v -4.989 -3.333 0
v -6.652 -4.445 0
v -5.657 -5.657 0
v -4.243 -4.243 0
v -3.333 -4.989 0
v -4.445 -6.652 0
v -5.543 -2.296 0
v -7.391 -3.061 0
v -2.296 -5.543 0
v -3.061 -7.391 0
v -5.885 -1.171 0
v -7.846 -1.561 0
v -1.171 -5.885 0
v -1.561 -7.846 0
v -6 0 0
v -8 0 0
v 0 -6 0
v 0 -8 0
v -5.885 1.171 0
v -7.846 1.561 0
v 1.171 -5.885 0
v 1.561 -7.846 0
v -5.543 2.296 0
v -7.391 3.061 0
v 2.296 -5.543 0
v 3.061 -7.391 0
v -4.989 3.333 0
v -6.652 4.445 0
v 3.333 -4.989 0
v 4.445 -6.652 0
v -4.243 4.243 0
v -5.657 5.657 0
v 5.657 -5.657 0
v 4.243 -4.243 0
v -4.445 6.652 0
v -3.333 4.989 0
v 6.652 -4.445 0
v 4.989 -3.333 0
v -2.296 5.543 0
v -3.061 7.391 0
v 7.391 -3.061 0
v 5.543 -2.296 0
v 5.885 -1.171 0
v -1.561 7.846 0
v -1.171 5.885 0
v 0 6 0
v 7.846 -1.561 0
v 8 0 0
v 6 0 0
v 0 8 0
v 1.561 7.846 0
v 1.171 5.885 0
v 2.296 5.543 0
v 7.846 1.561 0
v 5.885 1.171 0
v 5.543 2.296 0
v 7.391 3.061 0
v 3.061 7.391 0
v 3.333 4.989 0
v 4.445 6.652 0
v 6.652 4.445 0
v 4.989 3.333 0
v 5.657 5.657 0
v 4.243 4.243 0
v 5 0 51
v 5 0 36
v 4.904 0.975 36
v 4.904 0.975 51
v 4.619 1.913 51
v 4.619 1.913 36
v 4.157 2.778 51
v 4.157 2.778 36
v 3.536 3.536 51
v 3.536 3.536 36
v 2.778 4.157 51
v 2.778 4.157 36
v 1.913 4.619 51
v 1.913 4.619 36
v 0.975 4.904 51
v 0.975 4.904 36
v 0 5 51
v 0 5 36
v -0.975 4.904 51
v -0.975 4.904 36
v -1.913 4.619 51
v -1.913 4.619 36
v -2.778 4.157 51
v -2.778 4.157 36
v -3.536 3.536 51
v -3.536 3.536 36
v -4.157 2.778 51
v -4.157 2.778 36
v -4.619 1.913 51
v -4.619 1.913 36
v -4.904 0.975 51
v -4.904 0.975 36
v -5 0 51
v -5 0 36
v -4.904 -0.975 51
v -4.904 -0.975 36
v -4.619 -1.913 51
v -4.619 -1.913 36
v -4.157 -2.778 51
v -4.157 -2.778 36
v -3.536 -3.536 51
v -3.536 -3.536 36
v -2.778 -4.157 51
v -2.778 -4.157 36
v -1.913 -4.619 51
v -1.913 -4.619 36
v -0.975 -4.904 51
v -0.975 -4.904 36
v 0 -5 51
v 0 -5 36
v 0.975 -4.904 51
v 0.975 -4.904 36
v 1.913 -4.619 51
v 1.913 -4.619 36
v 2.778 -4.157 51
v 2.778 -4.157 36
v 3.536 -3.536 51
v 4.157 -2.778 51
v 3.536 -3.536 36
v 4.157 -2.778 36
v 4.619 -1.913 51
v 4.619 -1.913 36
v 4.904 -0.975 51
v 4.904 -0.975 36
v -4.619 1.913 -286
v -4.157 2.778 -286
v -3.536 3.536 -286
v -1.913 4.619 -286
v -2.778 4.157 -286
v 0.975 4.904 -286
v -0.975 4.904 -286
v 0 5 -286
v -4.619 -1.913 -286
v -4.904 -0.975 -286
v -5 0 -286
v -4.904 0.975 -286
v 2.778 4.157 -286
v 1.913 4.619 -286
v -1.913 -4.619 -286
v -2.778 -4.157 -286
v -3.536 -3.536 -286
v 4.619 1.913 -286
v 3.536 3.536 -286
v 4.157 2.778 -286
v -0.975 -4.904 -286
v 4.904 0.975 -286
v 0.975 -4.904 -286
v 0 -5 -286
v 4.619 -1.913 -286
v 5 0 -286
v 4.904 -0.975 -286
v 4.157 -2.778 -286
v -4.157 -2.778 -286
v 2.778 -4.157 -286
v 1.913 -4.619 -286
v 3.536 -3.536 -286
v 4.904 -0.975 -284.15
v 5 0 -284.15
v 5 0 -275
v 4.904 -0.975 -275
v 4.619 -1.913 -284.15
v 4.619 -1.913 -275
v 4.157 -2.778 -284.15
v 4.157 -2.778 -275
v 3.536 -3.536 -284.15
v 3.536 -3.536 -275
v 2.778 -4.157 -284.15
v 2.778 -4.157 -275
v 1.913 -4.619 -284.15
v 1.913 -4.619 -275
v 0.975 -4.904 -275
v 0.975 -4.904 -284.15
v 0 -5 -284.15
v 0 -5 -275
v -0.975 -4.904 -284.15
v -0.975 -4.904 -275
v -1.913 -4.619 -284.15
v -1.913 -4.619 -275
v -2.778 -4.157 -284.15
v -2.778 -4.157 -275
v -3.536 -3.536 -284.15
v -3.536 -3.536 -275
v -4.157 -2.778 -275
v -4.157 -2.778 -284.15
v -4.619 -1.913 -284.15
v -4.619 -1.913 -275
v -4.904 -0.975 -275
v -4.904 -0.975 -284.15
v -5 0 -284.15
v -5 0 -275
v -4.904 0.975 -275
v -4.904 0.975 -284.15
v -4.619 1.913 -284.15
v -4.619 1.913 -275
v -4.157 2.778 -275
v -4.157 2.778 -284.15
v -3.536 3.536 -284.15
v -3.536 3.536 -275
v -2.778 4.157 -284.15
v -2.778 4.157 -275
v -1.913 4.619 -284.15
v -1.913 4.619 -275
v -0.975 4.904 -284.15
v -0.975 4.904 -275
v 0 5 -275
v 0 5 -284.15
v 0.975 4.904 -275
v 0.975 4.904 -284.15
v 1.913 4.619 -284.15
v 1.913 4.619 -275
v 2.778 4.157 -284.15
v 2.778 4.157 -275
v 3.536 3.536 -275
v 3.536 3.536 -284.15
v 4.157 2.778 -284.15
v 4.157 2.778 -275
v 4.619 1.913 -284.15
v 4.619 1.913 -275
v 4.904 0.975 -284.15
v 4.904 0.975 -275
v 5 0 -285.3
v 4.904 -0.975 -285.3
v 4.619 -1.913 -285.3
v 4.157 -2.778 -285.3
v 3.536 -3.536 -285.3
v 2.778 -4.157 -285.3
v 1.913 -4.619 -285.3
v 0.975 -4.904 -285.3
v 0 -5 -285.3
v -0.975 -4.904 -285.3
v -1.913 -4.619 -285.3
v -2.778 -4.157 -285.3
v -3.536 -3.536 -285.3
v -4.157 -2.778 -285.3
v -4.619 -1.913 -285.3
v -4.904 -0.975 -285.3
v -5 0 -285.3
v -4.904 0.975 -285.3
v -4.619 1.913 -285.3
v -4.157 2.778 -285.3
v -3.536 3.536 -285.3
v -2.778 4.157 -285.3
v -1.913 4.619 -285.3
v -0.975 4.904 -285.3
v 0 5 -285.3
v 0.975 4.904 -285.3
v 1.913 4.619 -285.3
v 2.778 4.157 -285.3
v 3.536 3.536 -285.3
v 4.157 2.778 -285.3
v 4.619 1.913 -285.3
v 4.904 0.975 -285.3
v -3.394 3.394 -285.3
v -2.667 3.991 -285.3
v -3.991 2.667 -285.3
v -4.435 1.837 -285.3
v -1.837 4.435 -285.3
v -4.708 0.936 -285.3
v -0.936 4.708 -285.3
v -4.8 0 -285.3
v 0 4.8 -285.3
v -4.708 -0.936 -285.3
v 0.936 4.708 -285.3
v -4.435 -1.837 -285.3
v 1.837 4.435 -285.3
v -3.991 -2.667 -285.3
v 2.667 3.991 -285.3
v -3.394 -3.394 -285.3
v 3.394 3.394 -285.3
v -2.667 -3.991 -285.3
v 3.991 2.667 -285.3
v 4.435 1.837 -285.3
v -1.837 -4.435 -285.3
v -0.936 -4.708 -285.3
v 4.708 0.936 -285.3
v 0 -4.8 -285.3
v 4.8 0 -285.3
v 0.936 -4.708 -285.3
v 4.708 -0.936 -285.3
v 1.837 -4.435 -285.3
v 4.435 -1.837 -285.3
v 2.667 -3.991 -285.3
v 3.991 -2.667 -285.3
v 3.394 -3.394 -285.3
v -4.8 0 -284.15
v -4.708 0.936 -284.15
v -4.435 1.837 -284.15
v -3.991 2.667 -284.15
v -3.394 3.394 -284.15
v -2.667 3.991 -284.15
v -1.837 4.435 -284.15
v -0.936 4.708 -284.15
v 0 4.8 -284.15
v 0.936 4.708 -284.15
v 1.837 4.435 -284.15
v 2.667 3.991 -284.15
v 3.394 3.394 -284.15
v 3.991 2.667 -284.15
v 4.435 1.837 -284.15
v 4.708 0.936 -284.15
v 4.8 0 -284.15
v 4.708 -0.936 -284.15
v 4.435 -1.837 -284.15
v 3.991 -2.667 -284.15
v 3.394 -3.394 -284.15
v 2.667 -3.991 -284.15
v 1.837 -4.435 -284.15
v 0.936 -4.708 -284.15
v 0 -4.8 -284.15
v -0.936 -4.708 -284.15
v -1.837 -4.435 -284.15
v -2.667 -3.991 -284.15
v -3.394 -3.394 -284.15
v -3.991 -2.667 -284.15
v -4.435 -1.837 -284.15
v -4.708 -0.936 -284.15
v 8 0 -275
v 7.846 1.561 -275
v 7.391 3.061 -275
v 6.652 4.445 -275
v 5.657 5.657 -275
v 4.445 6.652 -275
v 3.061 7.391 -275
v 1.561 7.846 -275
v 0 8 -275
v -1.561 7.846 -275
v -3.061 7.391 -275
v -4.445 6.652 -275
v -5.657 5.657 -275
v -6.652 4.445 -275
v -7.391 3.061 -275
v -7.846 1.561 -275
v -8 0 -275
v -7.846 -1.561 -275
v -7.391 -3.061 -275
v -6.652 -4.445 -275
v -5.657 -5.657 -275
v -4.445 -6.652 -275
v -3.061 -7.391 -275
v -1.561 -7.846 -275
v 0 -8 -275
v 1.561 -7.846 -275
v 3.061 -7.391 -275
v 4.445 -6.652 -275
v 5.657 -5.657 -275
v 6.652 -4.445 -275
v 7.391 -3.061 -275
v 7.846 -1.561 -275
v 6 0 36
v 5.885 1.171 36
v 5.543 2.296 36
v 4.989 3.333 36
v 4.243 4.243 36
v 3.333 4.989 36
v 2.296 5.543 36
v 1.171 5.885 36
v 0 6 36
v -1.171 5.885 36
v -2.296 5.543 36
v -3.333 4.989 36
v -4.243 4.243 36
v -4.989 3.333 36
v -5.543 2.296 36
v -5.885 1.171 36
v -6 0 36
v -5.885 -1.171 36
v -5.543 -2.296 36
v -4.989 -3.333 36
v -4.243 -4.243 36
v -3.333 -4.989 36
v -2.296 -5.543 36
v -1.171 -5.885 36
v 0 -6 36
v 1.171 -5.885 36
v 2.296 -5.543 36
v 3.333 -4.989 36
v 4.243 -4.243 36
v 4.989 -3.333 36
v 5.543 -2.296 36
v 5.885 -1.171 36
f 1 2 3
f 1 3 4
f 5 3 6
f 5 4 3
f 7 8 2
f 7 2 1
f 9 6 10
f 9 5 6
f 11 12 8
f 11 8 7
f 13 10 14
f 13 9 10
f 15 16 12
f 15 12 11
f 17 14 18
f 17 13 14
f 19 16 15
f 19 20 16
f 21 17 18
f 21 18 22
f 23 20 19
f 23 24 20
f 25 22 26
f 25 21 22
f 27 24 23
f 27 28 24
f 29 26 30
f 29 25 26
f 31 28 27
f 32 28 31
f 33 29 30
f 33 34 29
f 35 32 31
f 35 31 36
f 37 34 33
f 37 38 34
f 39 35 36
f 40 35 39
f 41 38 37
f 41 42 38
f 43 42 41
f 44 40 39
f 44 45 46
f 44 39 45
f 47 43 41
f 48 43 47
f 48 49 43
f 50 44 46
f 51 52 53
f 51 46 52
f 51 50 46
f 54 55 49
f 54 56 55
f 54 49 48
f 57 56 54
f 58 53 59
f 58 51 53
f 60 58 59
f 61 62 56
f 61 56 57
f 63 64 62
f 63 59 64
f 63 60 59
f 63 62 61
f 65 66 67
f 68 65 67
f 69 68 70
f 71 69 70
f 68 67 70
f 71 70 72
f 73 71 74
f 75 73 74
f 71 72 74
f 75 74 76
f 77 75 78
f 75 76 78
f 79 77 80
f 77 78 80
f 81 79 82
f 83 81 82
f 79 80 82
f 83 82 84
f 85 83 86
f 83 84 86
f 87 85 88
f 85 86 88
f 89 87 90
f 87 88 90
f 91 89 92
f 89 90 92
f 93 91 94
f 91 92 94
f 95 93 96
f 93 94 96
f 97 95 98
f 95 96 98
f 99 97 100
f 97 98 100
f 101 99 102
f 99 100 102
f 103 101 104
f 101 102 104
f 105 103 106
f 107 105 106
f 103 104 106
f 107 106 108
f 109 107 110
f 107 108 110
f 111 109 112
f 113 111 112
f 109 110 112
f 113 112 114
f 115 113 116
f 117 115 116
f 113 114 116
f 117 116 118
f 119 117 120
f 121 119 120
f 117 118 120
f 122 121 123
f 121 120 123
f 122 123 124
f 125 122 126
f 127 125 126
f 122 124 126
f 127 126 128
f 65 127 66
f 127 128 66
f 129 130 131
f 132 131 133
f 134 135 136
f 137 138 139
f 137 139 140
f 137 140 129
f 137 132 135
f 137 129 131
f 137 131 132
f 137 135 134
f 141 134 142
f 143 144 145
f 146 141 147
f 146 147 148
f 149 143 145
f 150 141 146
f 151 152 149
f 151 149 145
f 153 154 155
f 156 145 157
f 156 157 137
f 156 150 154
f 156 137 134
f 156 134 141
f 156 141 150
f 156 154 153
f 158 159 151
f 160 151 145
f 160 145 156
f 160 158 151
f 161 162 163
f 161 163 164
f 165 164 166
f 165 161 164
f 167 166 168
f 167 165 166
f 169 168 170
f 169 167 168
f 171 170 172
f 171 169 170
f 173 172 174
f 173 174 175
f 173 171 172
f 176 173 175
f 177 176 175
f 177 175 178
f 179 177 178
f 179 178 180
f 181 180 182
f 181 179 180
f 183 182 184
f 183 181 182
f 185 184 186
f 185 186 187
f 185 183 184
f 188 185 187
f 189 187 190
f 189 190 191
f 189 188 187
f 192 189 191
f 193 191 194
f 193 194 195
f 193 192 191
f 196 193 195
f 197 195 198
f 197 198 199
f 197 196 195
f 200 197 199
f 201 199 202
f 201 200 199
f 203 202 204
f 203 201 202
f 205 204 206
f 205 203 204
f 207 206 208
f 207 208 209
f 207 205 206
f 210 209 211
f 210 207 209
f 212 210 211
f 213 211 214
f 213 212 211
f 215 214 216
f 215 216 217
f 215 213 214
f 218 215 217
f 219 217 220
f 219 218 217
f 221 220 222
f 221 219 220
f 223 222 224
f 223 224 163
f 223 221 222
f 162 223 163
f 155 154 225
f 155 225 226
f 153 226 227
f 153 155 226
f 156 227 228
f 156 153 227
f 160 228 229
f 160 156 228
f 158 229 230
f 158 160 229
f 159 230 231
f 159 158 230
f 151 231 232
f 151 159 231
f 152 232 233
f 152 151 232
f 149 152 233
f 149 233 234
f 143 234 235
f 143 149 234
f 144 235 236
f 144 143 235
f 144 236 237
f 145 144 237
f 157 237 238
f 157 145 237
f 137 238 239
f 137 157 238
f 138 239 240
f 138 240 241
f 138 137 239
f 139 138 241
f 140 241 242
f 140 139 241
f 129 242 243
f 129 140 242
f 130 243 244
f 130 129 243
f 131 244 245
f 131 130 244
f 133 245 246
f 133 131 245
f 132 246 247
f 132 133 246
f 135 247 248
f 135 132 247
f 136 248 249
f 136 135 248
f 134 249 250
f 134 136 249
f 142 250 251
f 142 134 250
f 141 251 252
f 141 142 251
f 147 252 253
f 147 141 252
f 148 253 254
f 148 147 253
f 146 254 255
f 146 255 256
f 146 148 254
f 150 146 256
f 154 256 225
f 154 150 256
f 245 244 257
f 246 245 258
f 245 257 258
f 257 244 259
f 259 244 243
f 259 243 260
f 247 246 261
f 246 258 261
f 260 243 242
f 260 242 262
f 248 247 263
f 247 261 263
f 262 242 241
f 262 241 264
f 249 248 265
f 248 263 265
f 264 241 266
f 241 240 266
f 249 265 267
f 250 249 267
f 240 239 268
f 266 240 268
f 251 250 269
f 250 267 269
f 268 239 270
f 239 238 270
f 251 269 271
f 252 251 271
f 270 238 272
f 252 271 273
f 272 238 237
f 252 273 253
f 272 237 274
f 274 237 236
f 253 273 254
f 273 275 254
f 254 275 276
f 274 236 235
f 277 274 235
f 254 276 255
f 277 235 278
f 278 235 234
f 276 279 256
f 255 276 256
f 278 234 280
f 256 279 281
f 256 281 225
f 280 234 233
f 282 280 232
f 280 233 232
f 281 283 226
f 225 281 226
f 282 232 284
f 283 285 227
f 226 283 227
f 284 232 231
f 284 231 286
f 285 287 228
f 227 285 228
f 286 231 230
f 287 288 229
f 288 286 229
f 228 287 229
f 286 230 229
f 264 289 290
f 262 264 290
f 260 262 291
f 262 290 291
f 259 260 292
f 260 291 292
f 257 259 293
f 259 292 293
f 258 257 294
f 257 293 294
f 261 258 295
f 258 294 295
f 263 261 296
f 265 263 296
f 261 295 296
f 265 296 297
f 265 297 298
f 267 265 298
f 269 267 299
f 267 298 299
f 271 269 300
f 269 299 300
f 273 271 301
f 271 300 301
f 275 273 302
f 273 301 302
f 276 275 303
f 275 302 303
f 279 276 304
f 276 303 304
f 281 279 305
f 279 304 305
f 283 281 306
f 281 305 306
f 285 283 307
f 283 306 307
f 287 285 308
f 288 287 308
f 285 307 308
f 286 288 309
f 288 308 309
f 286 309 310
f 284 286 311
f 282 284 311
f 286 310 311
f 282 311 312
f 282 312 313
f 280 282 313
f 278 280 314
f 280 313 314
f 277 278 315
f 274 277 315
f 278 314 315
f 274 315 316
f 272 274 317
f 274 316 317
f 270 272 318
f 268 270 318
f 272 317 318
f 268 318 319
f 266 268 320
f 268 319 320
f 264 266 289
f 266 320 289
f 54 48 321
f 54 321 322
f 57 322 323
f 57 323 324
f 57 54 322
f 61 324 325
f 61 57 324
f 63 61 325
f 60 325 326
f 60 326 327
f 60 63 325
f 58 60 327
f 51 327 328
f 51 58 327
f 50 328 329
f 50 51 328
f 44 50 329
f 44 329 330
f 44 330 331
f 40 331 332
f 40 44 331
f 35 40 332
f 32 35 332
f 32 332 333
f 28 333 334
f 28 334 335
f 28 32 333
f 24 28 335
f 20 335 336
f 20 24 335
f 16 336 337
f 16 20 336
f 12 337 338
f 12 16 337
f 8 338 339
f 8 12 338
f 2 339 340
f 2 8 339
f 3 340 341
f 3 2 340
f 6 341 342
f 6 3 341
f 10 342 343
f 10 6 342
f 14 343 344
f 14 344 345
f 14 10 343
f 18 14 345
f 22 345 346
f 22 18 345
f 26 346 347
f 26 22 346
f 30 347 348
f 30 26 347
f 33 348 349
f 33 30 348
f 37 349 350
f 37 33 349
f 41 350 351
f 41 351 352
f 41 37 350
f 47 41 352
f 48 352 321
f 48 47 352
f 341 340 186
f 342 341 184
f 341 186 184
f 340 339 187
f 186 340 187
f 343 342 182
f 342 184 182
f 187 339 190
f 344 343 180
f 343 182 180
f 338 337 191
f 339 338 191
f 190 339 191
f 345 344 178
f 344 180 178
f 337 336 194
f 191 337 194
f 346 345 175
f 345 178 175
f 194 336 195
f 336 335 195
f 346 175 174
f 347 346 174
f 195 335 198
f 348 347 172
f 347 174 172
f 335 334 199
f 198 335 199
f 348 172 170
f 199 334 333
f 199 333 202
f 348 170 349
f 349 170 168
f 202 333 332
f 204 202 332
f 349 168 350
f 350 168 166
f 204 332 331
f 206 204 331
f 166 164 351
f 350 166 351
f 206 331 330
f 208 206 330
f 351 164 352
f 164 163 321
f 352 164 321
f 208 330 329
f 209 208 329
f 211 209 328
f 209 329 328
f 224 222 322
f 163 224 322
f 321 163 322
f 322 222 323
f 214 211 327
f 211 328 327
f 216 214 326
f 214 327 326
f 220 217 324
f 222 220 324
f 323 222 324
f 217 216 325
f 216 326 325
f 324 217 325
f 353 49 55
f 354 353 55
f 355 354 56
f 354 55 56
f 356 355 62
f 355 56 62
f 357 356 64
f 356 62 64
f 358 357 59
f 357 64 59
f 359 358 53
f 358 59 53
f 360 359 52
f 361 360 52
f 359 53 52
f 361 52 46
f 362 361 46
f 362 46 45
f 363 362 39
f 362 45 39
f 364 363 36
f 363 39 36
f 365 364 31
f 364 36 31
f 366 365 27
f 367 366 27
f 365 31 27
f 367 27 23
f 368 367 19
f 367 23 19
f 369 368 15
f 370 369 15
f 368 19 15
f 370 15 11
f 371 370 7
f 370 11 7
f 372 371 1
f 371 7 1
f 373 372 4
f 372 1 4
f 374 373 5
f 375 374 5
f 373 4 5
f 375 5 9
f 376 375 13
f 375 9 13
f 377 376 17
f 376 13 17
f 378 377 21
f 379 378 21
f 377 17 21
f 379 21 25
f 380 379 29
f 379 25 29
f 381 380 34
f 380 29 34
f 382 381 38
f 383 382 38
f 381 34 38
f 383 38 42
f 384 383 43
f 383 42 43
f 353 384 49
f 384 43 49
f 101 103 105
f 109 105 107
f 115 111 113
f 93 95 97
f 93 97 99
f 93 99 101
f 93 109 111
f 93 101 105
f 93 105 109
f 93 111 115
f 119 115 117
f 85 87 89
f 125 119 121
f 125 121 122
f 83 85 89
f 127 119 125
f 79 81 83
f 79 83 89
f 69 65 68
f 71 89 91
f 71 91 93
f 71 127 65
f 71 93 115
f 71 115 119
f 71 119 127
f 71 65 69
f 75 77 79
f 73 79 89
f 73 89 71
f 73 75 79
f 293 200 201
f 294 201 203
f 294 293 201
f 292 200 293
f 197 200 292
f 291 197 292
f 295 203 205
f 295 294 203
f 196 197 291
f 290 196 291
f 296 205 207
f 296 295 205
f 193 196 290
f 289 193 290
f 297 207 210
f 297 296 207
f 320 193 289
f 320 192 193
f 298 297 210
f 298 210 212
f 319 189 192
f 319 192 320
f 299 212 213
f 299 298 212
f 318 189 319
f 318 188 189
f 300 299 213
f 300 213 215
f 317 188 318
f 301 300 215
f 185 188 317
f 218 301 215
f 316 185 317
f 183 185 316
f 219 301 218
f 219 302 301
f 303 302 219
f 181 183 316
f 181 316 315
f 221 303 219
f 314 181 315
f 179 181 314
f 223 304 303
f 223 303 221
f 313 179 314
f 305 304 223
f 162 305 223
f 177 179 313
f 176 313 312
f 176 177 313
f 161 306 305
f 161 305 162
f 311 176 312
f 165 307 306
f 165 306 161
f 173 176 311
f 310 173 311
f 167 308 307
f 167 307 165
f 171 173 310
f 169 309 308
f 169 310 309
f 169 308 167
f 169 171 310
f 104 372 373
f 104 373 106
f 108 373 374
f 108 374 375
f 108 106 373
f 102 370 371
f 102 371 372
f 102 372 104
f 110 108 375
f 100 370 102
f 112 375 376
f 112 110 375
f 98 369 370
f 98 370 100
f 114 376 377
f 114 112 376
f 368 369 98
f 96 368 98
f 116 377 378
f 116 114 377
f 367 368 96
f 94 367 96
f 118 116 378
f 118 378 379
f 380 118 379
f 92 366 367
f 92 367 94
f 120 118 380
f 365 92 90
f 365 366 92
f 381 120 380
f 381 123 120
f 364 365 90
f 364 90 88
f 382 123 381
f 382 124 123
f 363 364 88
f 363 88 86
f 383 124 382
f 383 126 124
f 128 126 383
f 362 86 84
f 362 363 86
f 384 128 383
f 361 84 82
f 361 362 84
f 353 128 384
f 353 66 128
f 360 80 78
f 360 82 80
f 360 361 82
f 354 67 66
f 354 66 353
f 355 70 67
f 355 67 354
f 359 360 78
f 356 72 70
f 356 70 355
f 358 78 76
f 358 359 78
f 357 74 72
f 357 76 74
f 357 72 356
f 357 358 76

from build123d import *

# Parameters (mm, degrees)
SKETCH1_R           = 8
BOSS_EXTRUDE1_DEPTH = 275
SKETCH2_R           = 6
BOSS_EXTRUDE2_DEPTH = 36
SKETCH3_R           = 5
BOSS_EXTRUDE3_DEPTH = 15
BOSS_EXTRUDE4_START = 9.15
SKETCH4_R           = 5
BOSS_EXTRUDE4_DEPTH = 9.15
SKETCH5_R           = 4.8
BOSS_EXTRUDE5_DEPTH = 1.15
BOSS_EXTRUDE6_START = 0.7
SKETCH7_R           = 5
BOSS_EXTRUDE6_DEPTH = 0.7


with BuildPart() as part:
    # Sketch1 → Boss-Extrude1 (new body)
    with BuildSketch(Plane.XY):
        Circle(SKETCH1_R)
    extrude(amount=-BOSS_EXTRUDE1_DEPTH)

    # Sketch2 → Boss-Extrude2 (add)
    with BuildSketch(Plane.XY):
        Circle(SKETCH2_R)
    extrude(amount=BOSS_EXTRUDE2_DEPTH)

    # Sketch3 → Boss-Extrude3 (add)
    with BuildSketch(Plane.XY.offset(36)):
        Circle(SKETCH3_R)
    extrude(amount=BOSS_EXTRUDE3_DEPTH)

    # Sketch4 → Boss-Extrude4 (add)
    with BuildSketch(Plane(origin=(0, 0, -275), x_dir=(-1, 0, 0), z_dir=(0, 0, -1)).offset(BOSS_EXTRUDE4_START)):
        with Locations(Location((0, 0, 0), (0, 0, 180))):
            Circle(SKETCH4_R)
    extrude(amount=-BOSS_EXTRUDE4_DEPTH)

    # Sketch5 → Boss-Extrude5 (add)
    with BuildSketch(Plane(origin=(0, 0, -284.15), x_dir=(-1, 0, 0), z_dir=(0, 0, -1))):
        Circle(SKETCH5_R)
    extrude(amount=BOSS_EXTRUDE5_DEPTH)

    # Sketch7 → Boss-Extrude6 (add)
    with BuildSketch(Plane(origin=(0, 0, -285.3), x_dir=(-1, 0, 0), z_dir=(0, 0, -1)).offset(BOSS_EXTRUDE6_START)):
        with Locations(Location((0, 0, 0), (0, 0, 180))):
            Circle(SKETCH7_R)
    extrude(amount=-BOSS_EXTRUDE6_DEPTH)


solid = part.part
